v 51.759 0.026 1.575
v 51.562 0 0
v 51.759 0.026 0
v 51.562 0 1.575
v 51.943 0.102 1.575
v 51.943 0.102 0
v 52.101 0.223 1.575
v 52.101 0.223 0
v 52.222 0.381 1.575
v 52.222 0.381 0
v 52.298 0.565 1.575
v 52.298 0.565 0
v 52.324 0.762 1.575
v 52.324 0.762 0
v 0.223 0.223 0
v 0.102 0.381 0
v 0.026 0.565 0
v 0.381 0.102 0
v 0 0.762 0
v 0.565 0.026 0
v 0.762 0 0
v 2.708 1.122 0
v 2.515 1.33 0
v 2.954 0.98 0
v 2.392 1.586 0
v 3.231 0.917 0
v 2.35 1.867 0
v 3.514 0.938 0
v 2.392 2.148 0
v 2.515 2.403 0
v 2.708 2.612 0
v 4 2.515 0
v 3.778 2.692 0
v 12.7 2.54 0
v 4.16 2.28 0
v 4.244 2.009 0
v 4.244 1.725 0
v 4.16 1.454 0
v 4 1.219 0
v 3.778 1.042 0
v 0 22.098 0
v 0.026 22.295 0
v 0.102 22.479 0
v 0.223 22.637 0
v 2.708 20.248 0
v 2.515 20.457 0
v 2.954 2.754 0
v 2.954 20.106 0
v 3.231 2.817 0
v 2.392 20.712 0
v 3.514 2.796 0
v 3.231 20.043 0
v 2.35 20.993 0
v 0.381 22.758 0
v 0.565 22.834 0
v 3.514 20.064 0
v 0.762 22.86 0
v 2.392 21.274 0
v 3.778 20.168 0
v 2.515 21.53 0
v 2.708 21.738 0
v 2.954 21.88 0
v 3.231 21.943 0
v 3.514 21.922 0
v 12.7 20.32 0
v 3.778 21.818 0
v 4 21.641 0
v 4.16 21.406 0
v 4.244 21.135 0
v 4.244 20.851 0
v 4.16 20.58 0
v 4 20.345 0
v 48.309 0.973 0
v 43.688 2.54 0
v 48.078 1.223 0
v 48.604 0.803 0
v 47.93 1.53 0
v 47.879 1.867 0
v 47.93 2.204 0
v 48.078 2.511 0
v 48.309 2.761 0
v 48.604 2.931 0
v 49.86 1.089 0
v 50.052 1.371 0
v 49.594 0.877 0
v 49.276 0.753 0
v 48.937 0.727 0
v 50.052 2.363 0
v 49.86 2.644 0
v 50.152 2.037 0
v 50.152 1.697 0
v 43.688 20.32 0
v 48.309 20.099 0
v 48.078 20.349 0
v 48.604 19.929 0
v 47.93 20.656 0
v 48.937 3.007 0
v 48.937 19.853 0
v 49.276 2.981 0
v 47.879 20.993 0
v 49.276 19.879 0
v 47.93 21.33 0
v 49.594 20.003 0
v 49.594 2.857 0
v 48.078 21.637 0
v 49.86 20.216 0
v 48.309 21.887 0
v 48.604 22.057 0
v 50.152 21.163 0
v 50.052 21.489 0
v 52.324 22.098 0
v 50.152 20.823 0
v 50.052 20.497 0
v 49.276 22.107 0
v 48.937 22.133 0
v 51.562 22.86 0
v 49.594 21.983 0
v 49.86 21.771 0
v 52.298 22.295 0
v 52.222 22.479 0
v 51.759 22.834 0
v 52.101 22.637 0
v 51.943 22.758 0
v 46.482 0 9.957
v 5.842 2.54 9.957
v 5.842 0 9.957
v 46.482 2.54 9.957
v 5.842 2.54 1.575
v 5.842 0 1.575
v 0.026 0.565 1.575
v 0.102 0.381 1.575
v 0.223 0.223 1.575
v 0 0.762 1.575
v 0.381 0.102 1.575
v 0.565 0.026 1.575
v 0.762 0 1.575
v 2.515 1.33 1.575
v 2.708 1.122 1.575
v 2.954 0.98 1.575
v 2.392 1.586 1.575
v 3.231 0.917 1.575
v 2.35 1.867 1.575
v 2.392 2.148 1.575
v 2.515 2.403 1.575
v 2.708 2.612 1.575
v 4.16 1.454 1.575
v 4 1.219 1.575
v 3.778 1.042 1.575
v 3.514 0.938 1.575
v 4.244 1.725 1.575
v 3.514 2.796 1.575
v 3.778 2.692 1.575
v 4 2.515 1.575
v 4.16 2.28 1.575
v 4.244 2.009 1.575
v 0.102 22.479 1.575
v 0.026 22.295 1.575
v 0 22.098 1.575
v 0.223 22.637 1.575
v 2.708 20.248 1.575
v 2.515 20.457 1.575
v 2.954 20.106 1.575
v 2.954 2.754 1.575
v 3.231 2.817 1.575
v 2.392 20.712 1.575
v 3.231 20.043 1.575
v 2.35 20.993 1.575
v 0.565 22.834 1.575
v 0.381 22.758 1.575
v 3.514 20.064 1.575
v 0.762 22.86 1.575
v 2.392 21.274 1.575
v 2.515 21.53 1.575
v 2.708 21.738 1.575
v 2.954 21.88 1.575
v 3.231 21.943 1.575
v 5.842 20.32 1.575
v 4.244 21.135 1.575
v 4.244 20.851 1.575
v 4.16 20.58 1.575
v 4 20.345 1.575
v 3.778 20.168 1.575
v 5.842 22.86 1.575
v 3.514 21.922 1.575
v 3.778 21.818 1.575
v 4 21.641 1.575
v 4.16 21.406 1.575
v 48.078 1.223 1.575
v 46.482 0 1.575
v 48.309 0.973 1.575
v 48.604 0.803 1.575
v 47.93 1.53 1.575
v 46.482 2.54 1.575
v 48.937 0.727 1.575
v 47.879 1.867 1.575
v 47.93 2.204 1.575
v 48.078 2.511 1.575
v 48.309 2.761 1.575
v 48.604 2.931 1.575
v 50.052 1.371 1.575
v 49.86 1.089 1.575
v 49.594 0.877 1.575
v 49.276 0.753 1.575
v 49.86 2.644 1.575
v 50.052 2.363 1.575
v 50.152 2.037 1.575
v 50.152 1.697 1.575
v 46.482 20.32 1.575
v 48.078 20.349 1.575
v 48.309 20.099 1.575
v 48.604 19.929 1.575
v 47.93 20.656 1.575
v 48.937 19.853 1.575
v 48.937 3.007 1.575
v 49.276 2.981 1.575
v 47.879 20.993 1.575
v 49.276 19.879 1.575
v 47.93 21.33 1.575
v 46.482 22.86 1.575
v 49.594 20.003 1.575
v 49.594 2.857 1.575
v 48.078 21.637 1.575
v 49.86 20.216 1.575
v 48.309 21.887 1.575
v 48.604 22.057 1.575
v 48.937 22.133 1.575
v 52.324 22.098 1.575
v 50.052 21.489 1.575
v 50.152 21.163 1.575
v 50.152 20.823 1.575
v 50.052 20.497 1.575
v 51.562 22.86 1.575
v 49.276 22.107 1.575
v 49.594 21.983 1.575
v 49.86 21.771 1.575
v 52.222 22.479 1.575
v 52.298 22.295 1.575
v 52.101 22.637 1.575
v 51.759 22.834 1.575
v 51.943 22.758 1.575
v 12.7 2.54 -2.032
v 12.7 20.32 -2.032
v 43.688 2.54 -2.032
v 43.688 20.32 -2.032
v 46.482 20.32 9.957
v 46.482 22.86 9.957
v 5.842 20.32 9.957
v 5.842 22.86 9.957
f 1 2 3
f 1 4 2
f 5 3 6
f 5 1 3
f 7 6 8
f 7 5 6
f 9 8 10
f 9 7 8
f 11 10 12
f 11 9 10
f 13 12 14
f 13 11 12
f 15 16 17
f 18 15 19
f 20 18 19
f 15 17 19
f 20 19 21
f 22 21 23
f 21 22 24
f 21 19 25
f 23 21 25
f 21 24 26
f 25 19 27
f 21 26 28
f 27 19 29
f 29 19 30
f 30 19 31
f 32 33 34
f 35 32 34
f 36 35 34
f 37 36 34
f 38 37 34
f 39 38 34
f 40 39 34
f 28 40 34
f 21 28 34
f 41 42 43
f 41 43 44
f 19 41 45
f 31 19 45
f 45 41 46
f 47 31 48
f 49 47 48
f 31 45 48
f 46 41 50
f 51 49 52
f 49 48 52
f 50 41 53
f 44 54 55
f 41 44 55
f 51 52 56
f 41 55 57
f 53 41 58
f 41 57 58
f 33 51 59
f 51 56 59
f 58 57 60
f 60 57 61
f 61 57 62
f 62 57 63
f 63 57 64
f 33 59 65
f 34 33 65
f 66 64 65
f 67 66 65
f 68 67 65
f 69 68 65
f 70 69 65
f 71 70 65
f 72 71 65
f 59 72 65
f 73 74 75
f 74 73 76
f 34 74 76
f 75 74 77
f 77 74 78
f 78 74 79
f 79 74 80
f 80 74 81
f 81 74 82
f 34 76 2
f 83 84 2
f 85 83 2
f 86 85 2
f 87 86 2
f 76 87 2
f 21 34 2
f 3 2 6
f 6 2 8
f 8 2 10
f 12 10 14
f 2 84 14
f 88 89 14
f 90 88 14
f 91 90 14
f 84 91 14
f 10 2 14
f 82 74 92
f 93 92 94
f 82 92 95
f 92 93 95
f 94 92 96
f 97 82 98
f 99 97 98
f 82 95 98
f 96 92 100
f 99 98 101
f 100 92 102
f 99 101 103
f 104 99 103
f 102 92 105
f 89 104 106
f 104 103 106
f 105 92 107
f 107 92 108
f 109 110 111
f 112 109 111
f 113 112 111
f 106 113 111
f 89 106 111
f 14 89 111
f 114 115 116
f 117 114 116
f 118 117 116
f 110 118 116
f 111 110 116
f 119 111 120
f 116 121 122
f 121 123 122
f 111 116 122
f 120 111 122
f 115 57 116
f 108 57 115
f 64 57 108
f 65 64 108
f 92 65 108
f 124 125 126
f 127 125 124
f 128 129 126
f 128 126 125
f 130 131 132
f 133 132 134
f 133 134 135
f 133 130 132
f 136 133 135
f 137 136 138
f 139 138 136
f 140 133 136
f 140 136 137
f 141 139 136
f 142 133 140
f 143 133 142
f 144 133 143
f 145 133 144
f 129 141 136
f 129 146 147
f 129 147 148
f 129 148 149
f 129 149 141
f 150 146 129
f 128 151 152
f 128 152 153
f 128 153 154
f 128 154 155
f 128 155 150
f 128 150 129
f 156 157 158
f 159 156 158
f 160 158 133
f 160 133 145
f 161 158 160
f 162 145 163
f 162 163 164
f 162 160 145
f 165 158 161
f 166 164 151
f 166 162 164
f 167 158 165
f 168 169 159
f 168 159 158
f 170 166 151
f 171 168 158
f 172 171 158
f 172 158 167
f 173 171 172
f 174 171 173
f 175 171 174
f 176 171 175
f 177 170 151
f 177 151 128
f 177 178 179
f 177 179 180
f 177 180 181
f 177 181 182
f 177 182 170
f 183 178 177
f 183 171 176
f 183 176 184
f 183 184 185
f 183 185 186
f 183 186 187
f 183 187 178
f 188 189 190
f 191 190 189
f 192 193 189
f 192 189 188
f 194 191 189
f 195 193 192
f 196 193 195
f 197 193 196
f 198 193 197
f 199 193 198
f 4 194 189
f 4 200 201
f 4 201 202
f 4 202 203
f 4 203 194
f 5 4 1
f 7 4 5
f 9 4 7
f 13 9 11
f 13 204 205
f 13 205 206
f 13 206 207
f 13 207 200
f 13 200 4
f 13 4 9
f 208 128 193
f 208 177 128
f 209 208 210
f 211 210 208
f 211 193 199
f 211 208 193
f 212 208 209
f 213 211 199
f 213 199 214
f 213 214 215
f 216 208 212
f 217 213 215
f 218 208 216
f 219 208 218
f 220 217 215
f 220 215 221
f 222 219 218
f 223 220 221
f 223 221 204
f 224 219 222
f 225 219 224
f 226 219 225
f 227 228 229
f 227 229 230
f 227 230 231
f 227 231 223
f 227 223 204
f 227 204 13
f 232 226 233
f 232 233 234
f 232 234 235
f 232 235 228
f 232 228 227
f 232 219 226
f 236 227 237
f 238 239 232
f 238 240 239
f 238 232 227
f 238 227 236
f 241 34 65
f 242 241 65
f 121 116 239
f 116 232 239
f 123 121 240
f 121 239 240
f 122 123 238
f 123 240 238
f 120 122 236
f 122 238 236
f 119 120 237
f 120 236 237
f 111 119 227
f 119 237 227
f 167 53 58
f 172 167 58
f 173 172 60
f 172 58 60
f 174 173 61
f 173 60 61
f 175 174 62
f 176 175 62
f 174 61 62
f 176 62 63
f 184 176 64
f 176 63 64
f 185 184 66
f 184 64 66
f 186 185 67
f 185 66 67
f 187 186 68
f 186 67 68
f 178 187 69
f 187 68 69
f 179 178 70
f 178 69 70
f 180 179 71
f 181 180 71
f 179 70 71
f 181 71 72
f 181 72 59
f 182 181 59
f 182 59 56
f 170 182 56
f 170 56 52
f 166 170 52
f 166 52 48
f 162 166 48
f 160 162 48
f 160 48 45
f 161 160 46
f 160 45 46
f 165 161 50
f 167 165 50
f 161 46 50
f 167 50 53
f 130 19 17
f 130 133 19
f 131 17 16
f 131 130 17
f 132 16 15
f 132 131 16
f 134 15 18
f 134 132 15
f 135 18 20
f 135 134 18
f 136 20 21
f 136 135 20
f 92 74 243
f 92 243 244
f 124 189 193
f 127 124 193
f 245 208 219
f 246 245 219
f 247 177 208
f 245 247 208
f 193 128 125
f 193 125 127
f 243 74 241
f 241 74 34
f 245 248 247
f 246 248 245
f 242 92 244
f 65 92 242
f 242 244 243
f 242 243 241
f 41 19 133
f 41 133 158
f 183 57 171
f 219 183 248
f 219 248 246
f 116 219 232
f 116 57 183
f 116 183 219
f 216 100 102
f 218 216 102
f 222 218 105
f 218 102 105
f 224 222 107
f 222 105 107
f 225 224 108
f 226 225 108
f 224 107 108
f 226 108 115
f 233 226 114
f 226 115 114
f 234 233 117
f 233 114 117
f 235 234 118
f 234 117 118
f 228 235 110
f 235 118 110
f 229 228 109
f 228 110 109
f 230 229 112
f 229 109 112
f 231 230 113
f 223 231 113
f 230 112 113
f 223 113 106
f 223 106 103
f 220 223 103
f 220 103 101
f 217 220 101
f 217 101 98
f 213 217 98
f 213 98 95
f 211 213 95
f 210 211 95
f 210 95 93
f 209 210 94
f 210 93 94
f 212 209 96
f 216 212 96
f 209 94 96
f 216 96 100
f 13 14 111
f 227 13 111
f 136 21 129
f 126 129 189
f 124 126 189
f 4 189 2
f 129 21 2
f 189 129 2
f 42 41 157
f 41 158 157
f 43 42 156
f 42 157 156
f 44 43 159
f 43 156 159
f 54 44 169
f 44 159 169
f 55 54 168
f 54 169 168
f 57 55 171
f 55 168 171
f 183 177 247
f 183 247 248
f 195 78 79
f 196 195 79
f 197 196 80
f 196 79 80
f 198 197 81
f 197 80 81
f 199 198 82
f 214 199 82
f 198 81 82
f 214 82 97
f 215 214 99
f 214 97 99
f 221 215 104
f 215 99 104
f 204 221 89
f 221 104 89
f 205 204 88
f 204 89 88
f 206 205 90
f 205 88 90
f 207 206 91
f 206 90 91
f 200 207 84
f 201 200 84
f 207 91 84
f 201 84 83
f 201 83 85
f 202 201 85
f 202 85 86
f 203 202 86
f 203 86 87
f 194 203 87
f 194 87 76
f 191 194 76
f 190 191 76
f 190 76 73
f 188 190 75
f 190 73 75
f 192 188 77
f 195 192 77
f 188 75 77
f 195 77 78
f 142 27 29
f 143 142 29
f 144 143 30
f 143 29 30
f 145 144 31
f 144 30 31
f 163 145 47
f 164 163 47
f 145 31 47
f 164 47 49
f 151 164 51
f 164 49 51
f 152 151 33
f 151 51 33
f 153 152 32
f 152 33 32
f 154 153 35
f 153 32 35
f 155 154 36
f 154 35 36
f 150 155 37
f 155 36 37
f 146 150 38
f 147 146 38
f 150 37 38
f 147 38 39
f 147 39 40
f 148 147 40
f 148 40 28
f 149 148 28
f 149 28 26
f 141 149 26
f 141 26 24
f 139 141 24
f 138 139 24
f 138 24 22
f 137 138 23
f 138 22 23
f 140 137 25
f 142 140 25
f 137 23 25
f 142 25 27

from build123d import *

# Parameters (mm, degrees)
SKETCH1_W           = 52.324
SKETCH1_H           = 22.86
BOSS_EXTRUDE1_DEPTH = 1.5748
SKETCH2_W           = 30.988
SKETCH2_H           = 17.78
BOSS_EXTRUDE2_DEPTH = 2.032
SKETCH3_W           = 40.64
SKETCH3_H           = 2.54
BOSS_EXTRUDE3_DEPTH = 8.382
FILLET1_R           = 0.762
SKETCH4_R           = 1.143
SKETCH4_R_2         = 0.9525
CUT_EXTRUDE1_DEPTH  = 1.5748


with BuildPart() as part:
    # Sketch1 → Boss-Extrude1 (new body)
    with BuildSketch(Plane.XY):
        with Locations((26.162, 11.43)):
            Rectangle(SKETCH1_W, SKETCH1_H)
    extrude(amount=BOSS_EXTRUDE1_DEPTH)

    # Sketch2 → Boss-Extrude2 (add)
    with BuildSketch(Plane(origin=(0, 0, 0), x_dir=(-1, 0, 0), z_dir=(0, 0, -1))):
        with Locations((-28.194, 11.43)):
            Rectangle(SKETCH2_W, SKETCH2_H)
    extrude(amount=BOSS_EXTRUDE2_DEPTH)

    # Sketch3 → Boss-Extrude3 (add)
    with BuildSketch(Plane.XY.offset(1.5748)):
        with Locations((26.162, 21.59)):
            Rectangle(SKETCH3_W, SKETCH3_H)
        with Locations((26.162, 1.27)):
            Rectangle(SKETCH3_W, SKETCH3_H)
    extrude(amount=BOSS_EXTRUDE3_DEPTH)

    # Fillet1
    fillet1_edges = [part.edges().sort_by_distance(p)[0] for p in [
        (0, 22.86, 0.7874),
        (52.324, 22.86, 0.7874),
        (52.324, 0, 0.7874),
        (0, 0, 0.7874),
    ]]
    fillet(fillet1_edges, radius=FILLET1_R)

    # Sketch4 → Cut-Extrude1 (cut)
    with BuildSketch(Plane(origin=(0, 0, 0), x_dir=(-1, 0, 0), z_dir=(0, 0, -1))):
        with Locations((-49.022, 20.9931)):
            Circle(SKETCH4_R)
        with Locations((-3.302, 20.9931)):
            Circle(SKETCH4_R_2)
        with Locations((-3.302, 1.8669)):
            Circle(SKETCH4_R_2)
        with Locations((-49.022, 1.8669)):
            Circle(SKETCH4_R)
    extrude(amount=-CUT_EXTRUDE1_DEPTH, mode=Mode.SUBTRACT)


solid = part.part
